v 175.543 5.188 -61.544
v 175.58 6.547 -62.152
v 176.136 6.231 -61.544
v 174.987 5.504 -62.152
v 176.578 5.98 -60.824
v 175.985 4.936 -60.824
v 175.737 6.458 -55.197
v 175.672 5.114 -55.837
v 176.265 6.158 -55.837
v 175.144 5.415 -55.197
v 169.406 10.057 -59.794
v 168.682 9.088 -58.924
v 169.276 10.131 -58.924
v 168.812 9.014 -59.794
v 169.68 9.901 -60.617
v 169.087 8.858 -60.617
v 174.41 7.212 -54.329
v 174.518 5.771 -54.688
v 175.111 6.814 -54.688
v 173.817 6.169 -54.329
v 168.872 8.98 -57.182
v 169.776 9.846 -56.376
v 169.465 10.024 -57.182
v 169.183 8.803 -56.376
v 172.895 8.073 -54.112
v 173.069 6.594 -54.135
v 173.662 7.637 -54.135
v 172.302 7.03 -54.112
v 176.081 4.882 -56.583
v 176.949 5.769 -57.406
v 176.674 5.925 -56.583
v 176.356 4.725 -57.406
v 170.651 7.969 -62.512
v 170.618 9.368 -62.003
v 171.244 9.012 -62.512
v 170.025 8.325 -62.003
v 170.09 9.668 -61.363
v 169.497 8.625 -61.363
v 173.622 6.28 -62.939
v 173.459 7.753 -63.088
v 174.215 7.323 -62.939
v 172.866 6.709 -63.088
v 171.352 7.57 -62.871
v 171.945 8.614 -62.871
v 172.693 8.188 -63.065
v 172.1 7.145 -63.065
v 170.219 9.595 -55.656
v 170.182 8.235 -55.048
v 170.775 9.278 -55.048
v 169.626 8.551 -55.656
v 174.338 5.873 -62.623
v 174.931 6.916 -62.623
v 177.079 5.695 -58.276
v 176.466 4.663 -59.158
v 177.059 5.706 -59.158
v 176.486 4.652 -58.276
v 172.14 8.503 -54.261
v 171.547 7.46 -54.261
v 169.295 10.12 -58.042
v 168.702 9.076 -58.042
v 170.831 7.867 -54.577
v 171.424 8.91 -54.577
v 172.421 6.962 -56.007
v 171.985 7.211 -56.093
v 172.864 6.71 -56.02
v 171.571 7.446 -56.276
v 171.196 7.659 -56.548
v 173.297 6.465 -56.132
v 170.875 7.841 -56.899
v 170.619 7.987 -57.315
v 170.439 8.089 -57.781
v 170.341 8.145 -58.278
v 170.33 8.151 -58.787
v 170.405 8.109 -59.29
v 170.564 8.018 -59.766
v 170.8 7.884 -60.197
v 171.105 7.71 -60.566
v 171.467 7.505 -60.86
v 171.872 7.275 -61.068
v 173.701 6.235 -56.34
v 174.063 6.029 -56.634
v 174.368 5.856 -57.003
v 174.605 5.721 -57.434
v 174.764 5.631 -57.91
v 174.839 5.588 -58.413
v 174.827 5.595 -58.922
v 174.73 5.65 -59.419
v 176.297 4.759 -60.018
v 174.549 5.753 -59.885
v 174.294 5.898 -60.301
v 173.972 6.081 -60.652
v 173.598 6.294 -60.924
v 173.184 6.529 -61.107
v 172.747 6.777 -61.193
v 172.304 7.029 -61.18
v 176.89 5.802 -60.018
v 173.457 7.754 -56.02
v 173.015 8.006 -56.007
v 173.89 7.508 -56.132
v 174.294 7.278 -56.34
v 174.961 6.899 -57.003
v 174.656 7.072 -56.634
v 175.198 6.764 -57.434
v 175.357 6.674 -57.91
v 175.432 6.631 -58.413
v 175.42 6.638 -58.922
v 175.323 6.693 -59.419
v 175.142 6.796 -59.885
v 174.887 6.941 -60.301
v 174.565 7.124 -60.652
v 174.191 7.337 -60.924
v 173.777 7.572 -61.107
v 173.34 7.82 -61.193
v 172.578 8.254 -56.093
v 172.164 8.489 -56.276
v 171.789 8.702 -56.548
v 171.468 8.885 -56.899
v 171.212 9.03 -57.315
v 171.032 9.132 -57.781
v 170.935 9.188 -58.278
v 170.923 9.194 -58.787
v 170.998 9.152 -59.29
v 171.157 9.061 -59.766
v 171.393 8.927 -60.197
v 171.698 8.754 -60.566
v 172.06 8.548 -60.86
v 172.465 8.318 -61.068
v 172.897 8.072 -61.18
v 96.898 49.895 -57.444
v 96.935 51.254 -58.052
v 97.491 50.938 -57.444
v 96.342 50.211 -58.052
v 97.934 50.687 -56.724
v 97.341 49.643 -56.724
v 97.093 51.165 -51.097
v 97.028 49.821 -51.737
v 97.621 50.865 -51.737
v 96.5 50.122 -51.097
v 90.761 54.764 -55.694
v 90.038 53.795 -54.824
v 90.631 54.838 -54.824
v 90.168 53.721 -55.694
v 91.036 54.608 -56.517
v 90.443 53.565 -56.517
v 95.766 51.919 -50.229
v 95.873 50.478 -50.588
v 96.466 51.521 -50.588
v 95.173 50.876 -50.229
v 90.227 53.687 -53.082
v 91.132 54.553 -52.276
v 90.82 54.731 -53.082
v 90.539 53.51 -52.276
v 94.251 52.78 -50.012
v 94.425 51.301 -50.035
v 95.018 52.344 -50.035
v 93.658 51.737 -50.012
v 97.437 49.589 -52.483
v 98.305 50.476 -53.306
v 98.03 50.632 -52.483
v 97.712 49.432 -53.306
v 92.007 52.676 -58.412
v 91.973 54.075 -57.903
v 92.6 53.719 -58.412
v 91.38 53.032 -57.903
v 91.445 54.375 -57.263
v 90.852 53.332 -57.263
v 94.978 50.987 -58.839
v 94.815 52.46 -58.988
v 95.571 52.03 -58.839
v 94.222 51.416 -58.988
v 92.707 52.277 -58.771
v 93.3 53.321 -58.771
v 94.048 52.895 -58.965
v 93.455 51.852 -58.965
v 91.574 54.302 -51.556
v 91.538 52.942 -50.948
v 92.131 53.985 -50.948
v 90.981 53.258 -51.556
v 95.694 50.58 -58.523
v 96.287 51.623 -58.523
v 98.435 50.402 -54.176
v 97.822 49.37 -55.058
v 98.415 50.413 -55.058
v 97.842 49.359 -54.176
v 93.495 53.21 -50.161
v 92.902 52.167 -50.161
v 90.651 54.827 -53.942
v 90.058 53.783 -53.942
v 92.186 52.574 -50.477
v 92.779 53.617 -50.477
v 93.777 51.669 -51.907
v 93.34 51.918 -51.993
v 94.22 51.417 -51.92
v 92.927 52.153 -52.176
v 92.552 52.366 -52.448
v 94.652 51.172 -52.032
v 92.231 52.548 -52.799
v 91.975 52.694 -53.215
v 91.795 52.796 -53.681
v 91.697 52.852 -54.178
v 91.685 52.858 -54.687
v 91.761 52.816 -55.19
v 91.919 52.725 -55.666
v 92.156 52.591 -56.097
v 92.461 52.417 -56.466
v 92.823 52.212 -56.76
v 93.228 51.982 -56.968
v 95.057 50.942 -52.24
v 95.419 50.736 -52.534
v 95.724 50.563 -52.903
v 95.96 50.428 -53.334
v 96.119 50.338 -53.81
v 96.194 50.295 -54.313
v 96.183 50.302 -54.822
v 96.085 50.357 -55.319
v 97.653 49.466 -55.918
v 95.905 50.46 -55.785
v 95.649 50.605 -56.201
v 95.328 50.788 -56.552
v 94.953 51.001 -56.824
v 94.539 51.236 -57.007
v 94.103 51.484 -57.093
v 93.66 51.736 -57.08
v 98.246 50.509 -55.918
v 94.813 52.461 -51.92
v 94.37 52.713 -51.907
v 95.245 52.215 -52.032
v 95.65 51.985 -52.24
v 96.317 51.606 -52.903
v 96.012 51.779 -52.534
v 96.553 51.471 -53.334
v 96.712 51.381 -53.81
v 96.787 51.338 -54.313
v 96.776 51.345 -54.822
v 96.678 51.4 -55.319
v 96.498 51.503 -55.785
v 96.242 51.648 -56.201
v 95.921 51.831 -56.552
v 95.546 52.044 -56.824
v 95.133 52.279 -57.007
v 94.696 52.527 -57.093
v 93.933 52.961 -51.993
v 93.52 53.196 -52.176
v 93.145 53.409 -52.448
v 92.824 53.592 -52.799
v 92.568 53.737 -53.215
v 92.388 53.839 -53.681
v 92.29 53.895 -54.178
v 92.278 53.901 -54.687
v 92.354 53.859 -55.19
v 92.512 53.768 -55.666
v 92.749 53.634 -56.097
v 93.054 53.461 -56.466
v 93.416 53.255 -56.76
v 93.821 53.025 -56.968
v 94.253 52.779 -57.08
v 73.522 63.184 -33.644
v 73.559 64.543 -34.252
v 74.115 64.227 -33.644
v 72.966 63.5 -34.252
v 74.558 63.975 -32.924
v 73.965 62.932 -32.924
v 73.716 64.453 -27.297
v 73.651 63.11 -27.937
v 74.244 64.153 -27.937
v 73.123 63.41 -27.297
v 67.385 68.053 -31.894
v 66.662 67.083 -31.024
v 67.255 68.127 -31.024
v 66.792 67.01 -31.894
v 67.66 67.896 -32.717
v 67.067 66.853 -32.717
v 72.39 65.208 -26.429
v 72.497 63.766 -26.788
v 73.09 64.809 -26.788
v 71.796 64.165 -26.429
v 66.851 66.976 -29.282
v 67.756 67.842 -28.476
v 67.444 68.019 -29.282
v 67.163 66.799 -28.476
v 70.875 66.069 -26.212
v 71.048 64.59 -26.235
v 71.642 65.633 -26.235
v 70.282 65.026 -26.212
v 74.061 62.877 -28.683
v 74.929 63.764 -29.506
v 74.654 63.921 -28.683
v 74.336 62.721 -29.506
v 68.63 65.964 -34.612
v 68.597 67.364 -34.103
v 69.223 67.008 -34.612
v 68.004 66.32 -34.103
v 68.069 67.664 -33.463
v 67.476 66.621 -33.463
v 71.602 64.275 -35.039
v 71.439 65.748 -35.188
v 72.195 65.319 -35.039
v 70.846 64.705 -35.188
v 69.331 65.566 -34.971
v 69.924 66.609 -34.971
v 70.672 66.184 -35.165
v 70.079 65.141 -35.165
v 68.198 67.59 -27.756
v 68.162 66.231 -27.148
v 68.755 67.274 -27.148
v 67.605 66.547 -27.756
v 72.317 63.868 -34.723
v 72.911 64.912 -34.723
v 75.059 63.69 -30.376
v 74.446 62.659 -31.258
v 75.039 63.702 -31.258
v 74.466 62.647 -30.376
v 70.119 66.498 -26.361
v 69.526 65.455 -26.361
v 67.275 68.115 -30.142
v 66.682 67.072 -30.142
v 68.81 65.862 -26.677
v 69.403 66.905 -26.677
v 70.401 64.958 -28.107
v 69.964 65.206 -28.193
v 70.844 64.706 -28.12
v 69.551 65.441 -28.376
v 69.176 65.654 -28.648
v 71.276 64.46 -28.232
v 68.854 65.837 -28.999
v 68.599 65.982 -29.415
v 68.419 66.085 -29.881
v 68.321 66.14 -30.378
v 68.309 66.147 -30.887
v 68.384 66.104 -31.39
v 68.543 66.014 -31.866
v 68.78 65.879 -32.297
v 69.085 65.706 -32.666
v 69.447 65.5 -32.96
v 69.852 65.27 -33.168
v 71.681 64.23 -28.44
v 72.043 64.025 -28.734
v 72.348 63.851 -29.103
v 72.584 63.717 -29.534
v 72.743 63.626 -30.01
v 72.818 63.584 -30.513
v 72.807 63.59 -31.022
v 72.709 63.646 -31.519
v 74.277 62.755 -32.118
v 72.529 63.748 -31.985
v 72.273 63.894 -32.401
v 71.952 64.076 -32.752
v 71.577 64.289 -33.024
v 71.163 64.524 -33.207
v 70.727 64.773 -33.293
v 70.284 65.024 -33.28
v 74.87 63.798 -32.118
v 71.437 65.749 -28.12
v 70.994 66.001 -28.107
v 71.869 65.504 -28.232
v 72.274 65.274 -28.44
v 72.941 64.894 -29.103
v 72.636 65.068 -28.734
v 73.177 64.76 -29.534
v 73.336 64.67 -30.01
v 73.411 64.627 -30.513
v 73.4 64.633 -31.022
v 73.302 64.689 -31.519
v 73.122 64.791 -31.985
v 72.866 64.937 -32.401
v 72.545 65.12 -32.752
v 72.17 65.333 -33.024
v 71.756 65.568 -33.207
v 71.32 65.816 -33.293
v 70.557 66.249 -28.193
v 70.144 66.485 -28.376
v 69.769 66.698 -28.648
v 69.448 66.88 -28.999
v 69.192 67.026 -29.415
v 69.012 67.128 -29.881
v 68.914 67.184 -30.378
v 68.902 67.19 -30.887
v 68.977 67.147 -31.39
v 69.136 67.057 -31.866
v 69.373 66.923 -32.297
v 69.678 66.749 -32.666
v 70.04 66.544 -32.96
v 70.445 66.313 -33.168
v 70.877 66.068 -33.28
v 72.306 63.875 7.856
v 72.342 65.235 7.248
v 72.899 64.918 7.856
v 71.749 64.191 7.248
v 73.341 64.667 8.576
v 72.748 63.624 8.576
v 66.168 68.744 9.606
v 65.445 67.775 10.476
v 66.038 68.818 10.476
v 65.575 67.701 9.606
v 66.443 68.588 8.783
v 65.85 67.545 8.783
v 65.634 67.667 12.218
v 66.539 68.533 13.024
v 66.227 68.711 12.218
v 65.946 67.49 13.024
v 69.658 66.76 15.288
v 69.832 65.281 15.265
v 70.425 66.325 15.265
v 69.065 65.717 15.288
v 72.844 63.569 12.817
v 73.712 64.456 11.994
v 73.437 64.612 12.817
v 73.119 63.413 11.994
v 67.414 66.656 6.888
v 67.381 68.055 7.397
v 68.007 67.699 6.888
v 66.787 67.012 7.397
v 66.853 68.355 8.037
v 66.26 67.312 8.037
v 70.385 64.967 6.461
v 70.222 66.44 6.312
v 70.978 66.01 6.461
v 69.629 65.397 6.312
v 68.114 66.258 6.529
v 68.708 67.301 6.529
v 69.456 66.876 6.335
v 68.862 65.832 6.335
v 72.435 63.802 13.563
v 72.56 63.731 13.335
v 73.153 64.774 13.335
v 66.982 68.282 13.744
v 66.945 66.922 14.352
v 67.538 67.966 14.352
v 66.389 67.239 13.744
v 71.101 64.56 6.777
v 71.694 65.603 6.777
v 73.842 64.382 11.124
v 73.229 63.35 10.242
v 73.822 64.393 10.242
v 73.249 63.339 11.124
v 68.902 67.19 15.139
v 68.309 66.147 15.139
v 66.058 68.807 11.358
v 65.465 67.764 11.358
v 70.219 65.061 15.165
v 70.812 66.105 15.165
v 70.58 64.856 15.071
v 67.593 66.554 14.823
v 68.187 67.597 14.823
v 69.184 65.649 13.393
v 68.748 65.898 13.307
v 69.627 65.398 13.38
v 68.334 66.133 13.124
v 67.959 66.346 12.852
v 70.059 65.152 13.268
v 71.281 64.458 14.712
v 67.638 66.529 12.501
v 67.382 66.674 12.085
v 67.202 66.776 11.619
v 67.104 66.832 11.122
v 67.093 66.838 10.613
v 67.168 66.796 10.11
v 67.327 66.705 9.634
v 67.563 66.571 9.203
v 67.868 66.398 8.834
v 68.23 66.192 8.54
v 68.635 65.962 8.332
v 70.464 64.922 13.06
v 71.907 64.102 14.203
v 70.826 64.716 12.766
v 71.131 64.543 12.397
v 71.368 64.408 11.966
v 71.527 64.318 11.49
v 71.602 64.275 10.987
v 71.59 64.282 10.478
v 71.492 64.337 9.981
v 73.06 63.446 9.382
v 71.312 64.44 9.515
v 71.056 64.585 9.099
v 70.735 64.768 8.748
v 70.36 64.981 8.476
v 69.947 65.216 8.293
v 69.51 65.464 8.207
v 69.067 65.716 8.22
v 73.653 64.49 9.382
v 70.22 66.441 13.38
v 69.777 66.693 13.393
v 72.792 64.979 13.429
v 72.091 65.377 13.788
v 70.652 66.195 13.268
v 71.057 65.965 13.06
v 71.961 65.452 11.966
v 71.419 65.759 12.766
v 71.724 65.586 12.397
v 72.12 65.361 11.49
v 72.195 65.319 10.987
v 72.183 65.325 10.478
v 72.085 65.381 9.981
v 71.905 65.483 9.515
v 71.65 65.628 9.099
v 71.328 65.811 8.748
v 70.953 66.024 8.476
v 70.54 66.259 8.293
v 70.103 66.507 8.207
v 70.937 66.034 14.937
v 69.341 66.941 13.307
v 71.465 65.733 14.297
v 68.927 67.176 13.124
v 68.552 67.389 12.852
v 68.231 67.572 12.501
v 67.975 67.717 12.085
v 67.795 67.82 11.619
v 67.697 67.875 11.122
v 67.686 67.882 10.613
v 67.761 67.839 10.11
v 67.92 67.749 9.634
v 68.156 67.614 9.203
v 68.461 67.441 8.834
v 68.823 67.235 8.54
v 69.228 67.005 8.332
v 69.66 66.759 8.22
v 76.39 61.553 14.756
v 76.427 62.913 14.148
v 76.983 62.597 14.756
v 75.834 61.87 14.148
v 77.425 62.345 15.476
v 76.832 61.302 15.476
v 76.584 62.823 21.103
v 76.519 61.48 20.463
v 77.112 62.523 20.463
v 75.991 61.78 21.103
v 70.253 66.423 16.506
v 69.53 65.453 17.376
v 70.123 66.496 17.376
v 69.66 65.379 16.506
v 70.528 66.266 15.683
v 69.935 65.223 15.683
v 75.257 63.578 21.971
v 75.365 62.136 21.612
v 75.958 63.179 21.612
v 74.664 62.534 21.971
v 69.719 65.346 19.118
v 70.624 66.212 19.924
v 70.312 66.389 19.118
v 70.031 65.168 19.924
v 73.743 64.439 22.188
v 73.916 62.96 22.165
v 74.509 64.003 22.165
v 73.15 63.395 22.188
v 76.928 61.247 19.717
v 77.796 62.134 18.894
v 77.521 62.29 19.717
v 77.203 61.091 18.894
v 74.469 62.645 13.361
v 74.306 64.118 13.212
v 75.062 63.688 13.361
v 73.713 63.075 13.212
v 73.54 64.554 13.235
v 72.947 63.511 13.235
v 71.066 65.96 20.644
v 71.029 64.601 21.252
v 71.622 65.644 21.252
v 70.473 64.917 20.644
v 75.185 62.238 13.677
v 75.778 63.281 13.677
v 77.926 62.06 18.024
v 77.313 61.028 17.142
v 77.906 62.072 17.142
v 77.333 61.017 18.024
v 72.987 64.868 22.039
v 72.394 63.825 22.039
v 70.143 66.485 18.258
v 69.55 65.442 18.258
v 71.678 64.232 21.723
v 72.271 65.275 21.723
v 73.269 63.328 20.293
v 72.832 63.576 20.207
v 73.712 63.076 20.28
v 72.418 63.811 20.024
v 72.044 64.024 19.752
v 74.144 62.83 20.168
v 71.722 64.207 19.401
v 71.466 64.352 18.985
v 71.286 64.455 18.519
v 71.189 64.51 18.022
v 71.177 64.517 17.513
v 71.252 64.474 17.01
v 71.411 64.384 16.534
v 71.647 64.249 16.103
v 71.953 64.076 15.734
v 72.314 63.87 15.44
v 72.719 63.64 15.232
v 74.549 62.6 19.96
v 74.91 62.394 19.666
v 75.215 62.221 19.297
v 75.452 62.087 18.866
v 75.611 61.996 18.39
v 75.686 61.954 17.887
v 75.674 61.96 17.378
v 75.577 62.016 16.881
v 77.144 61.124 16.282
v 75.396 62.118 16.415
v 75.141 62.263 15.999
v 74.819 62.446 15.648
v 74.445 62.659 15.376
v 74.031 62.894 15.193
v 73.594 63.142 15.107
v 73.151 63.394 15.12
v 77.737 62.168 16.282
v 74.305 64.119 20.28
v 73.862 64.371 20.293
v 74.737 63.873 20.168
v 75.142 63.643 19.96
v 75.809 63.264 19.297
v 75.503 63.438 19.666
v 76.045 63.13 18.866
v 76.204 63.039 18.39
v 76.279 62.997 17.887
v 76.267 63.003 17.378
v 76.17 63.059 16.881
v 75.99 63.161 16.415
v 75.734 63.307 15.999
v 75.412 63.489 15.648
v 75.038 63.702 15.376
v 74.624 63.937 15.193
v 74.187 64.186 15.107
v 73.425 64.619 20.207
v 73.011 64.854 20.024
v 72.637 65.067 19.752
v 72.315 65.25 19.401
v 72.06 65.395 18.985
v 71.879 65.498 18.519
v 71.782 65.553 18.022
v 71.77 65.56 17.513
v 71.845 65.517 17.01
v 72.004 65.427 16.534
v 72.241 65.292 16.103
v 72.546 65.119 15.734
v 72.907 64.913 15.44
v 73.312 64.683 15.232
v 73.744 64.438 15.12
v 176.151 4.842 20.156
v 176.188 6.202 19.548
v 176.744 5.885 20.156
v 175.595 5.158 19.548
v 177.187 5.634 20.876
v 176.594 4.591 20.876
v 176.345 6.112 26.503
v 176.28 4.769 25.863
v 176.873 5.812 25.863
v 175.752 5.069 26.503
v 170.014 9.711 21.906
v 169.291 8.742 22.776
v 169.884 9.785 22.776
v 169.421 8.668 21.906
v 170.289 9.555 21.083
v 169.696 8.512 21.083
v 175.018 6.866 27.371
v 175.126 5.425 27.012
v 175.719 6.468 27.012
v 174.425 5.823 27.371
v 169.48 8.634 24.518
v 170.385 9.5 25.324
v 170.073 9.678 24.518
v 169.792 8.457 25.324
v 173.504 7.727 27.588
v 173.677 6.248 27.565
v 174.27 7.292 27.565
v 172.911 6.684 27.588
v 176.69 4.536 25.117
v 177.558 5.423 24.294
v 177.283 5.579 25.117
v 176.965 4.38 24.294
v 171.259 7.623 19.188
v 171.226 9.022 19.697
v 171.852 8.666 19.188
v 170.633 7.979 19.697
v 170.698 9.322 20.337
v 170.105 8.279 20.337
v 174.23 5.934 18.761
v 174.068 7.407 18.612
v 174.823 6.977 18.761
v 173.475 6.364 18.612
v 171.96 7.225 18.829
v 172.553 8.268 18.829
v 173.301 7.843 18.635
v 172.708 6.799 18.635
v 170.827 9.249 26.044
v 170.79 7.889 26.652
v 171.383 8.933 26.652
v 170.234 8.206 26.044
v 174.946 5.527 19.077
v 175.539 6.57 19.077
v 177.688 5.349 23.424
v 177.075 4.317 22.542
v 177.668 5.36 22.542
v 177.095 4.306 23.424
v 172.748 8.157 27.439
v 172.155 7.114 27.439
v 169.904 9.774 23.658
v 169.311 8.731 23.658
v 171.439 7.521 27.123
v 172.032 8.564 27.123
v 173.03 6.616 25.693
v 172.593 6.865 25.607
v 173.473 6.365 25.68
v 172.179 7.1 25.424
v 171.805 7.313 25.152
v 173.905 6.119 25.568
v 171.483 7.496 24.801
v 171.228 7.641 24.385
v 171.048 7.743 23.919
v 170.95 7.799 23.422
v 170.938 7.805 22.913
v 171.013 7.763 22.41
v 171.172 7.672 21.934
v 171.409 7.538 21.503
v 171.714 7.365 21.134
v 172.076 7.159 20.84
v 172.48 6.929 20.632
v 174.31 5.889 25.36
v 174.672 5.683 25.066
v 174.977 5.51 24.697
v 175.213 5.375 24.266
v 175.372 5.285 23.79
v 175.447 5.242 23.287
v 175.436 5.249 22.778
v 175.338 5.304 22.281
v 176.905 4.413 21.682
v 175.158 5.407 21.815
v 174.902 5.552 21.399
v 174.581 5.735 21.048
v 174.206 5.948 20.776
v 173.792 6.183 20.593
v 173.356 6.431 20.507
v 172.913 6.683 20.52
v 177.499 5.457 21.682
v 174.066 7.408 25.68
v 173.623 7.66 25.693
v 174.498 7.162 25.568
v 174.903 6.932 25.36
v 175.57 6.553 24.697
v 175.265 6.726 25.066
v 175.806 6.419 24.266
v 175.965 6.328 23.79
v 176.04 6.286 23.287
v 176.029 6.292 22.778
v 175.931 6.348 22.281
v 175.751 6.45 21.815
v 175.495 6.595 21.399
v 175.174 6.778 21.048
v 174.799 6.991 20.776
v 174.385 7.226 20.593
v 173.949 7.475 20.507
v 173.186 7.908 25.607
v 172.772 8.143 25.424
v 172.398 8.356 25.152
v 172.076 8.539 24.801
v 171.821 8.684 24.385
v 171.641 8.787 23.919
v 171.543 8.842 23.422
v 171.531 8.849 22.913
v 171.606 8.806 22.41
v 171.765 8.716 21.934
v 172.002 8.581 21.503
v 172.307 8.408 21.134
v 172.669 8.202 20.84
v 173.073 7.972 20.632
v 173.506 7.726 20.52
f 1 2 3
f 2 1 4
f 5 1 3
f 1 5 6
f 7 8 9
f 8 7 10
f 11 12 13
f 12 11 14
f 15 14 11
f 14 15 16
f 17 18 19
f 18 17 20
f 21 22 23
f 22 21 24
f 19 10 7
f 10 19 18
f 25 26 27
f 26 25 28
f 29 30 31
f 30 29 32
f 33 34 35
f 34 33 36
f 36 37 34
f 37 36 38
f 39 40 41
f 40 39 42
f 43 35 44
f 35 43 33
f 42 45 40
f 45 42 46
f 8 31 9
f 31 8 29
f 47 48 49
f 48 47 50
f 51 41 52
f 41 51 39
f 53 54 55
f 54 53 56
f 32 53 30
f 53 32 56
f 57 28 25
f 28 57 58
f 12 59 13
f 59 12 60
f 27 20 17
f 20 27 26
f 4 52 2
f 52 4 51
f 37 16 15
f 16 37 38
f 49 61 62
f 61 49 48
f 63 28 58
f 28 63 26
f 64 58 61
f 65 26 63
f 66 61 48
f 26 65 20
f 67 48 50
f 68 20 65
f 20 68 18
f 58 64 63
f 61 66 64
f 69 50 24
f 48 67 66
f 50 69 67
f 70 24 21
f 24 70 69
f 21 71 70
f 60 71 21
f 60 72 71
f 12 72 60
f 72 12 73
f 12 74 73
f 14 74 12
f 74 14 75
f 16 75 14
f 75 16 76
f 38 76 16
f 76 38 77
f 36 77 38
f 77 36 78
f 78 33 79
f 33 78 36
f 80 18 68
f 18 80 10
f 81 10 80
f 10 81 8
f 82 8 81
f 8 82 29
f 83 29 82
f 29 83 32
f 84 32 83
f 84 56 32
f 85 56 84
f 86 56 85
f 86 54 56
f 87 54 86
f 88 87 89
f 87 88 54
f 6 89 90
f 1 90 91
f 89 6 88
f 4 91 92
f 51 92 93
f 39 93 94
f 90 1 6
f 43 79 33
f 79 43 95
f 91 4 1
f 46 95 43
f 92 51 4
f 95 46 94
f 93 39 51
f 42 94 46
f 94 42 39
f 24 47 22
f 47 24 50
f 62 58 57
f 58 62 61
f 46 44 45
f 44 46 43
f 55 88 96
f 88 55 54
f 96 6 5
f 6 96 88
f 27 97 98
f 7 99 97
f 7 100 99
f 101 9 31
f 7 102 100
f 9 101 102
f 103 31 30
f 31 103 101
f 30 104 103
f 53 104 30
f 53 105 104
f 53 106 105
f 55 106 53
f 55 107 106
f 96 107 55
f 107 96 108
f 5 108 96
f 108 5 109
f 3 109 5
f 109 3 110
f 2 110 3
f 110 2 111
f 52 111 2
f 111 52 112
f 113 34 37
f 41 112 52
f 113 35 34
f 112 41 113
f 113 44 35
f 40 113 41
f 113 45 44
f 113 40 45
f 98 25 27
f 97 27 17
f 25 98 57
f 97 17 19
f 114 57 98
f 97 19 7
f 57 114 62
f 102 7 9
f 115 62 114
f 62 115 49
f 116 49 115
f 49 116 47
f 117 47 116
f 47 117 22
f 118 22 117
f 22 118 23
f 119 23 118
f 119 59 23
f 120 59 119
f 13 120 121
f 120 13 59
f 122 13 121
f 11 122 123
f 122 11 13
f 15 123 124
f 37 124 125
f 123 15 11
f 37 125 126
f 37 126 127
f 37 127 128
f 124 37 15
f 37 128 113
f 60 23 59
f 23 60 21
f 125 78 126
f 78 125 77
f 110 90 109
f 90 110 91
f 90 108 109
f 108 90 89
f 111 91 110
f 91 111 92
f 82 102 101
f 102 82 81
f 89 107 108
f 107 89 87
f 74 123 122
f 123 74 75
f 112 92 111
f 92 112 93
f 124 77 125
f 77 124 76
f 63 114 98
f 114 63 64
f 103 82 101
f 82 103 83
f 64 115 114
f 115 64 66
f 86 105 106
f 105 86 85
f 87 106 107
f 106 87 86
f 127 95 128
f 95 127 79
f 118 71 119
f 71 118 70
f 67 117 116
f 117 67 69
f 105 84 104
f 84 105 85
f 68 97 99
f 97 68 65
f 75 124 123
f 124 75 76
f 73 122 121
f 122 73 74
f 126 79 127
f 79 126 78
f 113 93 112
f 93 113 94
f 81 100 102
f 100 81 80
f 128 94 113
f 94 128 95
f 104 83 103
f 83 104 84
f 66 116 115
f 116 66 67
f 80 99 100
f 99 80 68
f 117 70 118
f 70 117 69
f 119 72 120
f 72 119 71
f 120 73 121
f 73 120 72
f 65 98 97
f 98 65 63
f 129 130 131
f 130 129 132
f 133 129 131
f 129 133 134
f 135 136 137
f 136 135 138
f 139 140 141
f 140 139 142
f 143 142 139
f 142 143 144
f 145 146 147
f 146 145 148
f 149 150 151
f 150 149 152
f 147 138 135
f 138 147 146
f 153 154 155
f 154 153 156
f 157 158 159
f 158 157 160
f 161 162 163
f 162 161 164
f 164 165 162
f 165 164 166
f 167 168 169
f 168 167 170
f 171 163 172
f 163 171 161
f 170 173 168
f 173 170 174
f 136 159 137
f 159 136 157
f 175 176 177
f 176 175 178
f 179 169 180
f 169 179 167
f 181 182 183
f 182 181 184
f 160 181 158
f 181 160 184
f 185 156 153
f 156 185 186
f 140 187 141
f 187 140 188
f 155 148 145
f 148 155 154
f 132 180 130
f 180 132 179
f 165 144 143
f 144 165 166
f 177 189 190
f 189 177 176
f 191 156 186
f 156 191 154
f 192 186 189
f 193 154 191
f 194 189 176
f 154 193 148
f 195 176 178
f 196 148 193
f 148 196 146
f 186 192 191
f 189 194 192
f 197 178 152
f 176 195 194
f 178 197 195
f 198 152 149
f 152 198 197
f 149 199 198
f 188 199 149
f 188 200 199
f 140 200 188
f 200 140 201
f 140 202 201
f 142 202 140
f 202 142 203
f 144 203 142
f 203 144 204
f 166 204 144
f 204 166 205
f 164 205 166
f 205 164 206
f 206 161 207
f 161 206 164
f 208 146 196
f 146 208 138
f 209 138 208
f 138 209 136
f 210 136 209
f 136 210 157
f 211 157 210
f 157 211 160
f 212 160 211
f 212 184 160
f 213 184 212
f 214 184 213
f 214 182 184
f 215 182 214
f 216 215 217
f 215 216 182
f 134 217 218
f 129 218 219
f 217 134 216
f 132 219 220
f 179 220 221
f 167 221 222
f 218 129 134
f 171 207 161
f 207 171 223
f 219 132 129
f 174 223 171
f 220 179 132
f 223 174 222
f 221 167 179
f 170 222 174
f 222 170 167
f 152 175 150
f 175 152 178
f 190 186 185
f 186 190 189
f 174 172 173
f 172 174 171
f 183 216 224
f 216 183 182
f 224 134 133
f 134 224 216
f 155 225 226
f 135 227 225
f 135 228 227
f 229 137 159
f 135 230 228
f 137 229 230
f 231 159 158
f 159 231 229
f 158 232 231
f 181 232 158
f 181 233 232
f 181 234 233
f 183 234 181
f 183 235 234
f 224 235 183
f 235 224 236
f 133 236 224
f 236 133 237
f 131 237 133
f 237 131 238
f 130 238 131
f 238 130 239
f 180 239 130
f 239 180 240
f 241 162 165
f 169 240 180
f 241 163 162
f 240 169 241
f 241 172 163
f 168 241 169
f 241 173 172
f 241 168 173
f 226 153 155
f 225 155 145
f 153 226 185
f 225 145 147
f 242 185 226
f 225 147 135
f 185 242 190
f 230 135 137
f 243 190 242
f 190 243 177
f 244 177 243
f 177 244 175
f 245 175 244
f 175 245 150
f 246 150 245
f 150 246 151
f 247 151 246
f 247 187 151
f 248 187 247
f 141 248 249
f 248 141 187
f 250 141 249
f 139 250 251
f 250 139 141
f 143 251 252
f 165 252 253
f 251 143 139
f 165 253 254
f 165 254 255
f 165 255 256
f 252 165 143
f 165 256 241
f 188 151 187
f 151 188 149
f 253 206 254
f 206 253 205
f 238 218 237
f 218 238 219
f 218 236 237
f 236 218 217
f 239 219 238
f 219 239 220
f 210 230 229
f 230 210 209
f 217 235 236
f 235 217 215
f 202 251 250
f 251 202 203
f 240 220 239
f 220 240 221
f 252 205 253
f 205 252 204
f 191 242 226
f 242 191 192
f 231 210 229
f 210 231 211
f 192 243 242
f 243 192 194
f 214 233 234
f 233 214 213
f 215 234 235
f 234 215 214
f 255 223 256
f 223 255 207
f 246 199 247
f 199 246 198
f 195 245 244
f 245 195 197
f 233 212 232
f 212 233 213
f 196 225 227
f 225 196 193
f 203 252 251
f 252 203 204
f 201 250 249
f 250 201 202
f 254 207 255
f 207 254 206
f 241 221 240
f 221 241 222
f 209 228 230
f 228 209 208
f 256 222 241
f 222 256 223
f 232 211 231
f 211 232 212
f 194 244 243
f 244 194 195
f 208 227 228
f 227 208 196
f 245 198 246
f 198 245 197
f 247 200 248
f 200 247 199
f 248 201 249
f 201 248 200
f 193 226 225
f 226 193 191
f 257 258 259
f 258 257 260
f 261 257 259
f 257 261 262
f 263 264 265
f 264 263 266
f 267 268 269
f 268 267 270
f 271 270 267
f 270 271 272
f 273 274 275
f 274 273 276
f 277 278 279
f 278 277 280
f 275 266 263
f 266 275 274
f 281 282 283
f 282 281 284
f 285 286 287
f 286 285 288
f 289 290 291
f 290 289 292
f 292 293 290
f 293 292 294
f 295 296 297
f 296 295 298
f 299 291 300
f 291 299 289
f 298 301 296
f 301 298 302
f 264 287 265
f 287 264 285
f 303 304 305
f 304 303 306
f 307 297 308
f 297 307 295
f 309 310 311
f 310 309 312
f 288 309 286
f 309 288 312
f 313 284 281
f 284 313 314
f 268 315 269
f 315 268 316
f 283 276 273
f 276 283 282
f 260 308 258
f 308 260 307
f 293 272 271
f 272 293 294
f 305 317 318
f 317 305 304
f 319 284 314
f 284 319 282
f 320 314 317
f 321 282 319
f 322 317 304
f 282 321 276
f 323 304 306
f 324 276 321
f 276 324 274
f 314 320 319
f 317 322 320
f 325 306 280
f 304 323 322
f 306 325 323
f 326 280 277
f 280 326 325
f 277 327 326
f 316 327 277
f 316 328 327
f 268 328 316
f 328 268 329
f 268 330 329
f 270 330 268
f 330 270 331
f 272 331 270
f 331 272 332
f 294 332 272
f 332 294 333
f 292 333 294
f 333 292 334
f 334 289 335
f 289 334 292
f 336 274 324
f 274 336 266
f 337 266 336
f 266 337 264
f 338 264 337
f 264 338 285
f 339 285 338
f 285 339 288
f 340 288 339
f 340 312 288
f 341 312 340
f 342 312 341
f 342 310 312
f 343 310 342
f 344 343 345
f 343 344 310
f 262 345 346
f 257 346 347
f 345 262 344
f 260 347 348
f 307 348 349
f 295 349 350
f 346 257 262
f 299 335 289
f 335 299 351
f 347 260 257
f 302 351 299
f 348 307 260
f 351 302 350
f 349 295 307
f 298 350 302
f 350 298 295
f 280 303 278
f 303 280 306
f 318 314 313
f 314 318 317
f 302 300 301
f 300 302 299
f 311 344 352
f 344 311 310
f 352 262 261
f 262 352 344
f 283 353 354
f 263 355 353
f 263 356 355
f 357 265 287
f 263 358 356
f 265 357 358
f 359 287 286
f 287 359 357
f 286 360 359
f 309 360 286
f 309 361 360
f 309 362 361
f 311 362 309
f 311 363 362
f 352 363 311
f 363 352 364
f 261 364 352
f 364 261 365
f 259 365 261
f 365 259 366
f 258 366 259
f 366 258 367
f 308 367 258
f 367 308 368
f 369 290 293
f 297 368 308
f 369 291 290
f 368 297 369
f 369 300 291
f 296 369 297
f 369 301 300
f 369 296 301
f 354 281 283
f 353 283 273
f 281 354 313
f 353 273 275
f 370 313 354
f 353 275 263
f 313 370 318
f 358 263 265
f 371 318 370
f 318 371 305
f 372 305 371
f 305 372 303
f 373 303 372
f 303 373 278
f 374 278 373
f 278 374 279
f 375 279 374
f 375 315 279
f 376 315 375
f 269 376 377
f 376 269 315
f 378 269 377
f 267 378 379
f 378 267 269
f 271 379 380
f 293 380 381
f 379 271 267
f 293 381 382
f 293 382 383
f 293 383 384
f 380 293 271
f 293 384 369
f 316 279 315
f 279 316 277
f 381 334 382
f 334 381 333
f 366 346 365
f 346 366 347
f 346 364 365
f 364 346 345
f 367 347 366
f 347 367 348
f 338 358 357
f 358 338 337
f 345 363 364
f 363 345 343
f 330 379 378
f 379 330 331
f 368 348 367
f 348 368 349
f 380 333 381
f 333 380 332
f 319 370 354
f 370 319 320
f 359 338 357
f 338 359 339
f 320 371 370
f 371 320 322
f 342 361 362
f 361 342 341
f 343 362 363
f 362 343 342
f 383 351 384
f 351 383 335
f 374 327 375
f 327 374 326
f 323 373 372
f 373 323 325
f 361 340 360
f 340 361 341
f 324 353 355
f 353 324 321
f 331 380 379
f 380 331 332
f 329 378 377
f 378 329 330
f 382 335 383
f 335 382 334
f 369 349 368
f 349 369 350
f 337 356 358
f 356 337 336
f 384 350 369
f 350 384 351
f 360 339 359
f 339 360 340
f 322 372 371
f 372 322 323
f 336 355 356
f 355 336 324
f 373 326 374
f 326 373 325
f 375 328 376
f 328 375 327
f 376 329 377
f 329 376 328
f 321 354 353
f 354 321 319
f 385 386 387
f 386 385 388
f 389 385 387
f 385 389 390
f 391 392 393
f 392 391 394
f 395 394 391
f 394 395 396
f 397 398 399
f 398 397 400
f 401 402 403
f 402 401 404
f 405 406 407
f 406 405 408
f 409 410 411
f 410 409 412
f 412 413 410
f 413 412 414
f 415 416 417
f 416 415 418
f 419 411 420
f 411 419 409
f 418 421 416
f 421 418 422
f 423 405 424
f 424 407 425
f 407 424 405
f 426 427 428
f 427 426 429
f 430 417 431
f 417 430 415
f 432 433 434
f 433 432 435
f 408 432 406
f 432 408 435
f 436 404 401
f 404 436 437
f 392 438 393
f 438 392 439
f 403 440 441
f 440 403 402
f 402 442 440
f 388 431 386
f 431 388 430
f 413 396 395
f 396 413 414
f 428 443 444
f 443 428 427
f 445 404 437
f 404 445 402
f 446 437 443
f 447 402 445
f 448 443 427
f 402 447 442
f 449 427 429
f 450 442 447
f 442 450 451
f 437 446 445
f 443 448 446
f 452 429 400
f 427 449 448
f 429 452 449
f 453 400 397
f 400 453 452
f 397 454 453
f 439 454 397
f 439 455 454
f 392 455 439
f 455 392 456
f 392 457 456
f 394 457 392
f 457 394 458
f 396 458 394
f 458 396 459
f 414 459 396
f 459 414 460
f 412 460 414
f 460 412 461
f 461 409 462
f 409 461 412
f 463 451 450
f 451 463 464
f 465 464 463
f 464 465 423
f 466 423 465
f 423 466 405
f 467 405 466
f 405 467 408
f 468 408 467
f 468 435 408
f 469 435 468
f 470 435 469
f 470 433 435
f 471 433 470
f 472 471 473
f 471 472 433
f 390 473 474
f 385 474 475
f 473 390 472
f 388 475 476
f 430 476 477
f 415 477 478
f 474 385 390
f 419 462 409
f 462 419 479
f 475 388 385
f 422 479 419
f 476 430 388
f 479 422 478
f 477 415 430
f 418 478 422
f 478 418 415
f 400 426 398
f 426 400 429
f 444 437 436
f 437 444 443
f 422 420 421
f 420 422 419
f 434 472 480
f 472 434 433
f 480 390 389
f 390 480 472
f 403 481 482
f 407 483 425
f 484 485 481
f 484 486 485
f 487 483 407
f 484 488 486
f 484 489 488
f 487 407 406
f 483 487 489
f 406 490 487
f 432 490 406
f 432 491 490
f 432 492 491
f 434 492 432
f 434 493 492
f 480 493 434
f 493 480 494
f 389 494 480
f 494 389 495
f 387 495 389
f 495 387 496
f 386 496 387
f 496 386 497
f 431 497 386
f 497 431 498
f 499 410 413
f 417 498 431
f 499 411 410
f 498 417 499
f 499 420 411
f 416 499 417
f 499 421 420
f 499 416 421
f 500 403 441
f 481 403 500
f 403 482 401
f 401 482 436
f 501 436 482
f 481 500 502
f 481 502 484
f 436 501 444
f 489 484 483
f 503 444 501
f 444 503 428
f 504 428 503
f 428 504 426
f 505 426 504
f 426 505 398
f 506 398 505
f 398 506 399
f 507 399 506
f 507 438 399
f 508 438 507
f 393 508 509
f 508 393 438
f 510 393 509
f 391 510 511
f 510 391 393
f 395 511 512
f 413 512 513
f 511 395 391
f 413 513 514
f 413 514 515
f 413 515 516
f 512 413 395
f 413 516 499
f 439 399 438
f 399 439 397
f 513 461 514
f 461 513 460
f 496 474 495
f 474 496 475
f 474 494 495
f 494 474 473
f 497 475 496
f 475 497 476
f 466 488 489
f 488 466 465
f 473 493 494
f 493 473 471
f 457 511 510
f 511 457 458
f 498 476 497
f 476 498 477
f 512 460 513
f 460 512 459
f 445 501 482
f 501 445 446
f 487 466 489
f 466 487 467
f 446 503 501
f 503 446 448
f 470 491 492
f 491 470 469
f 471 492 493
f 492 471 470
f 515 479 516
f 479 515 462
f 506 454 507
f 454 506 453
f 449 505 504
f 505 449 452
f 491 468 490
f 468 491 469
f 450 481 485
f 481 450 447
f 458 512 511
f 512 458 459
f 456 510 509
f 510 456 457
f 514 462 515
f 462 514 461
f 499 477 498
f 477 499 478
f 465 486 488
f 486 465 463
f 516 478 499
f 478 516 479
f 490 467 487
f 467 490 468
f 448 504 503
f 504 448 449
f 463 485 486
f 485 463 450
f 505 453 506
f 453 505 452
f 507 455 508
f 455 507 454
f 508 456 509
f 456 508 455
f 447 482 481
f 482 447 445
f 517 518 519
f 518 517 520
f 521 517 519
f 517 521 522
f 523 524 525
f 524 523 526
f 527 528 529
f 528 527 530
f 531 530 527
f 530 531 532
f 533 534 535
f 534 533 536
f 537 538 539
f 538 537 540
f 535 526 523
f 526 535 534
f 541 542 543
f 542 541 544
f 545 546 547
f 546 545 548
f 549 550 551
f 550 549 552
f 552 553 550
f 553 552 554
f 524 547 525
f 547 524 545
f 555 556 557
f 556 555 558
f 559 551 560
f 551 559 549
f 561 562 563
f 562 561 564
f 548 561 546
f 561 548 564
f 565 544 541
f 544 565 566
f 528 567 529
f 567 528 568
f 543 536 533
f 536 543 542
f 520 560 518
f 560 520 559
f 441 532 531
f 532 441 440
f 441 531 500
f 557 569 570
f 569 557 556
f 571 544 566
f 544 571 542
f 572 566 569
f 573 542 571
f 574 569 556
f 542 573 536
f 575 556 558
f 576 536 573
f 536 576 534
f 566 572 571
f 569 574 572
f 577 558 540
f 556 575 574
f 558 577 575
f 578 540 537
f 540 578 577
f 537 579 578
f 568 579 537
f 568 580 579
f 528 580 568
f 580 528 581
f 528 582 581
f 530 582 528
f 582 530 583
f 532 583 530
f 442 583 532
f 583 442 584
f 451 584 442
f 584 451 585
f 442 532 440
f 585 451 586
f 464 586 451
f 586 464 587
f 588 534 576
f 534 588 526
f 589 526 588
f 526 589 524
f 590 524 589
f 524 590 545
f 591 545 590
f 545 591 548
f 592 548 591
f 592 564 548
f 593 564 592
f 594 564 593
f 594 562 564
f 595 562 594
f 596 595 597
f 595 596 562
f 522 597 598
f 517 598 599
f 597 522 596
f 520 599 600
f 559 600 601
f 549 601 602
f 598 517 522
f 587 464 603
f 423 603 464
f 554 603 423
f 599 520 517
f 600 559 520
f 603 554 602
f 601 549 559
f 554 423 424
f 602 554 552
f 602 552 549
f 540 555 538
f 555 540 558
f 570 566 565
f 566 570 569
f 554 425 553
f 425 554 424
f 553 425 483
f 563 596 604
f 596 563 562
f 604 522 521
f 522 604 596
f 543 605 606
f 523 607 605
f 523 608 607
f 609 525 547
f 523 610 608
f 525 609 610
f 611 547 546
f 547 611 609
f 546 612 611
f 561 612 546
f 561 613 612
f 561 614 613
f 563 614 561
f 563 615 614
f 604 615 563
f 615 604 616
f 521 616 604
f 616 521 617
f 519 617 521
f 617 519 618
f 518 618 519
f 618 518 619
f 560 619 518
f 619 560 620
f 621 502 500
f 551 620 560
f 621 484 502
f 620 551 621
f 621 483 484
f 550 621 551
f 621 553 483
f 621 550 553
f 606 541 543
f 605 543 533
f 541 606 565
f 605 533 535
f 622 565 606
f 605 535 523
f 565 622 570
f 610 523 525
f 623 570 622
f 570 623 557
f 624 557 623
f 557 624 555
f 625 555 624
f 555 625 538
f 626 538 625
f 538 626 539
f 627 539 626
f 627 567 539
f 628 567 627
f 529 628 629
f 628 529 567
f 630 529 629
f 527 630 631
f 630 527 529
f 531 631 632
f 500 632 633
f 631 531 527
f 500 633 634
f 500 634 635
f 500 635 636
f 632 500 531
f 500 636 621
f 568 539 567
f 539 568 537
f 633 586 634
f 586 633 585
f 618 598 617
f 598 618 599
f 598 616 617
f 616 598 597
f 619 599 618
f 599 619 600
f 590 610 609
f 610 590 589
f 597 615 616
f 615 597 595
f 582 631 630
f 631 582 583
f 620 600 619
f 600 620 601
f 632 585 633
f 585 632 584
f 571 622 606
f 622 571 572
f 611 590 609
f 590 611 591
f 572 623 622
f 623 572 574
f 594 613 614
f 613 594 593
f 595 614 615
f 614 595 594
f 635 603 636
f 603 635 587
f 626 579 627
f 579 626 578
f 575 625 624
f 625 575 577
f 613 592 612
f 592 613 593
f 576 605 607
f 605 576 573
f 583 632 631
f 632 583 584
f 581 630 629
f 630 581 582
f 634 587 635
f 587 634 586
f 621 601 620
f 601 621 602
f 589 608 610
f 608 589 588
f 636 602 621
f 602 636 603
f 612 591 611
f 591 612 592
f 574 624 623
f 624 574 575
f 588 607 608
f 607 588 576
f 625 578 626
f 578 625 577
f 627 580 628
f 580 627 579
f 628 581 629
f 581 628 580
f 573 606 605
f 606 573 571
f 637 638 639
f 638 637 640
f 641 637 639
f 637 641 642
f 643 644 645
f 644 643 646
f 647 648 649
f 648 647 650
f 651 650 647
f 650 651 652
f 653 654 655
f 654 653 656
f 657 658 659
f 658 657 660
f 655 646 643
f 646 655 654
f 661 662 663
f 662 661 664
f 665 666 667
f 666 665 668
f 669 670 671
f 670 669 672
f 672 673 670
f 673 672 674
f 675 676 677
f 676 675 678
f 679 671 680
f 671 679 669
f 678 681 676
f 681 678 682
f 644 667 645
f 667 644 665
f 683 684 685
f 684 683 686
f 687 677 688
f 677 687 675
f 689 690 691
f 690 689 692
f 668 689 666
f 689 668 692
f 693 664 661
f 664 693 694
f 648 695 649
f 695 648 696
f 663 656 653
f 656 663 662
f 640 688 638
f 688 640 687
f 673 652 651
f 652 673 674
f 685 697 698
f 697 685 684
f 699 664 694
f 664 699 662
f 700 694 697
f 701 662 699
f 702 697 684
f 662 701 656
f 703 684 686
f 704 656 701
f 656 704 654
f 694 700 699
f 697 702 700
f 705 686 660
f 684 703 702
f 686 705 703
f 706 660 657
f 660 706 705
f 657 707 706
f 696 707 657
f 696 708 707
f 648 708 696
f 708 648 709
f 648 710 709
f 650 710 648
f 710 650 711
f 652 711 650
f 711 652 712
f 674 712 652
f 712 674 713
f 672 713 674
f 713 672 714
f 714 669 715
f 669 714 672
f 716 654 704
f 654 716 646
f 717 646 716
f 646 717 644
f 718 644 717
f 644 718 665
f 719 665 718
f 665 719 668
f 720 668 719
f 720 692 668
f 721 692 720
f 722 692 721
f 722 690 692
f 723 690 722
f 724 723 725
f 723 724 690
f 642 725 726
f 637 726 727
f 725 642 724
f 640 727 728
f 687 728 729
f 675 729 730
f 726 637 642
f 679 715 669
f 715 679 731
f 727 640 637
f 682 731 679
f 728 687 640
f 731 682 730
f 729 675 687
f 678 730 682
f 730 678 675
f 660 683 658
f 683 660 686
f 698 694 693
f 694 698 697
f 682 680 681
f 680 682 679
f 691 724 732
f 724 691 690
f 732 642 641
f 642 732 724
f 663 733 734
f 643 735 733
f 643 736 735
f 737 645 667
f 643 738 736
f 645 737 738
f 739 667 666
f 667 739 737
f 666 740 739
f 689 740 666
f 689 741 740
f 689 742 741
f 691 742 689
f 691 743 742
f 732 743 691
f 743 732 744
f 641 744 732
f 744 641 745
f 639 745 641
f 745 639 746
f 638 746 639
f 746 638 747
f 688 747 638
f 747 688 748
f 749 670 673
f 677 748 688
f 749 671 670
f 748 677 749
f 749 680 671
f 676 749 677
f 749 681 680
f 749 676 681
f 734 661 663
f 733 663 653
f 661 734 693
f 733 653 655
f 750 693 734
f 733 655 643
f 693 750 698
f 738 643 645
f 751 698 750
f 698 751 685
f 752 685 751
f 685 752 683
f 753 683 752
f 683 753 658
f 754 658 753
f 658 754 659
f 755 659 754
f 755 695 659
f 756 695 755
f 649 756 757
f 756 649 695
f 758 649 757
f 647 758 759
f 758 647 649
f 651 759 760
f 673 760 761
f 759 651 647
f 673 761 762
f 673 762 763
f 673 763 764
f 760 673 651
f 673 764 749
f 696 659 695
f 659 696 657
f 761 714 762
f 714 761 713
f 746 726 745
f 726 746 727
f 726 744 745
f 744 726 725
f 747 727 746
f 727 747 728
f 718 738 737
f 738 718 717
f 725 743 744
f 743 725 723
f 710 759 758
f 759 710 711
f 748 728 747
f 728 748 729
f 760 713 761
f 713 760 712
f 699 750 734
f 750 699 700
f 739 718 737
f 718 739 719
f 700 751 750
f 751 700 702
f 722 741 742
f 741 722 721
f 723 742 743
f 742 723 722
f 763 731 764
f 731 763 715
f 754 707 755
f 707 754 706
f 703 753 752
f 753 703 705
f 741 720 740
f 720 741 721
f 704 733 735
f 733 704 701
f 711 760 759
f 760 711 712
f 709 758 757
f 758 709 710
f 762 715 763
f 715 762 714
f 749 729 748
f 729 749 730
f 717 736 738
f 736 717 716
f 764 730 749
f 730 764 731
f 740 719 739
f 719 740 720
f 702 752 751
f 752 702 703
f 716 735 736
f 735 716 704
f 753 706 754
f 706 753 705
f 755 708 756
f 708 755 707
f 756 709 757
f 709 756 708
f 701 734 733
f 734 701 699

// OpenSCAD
w=91.9;
function P3(u,v)=[0.869*v+0.494*w, -0.494*v+0.869*w, u];
uv=[[-58.6,146.7],[-54.5,56.2],[-30.7,29.3],[10.8,27.9],[17.7,32.6],[23.1,147.4]];
module ring() rotate(a=90,v=[-0.869,0.494,0]) difference(){ cylinder(d=9,h=1.2,center=true,$fn=32); cylinder(d=5.2,h=3,center=true,$fn=32); }
for(h=uv) translate(P3(h[0],h[1])) ring();
